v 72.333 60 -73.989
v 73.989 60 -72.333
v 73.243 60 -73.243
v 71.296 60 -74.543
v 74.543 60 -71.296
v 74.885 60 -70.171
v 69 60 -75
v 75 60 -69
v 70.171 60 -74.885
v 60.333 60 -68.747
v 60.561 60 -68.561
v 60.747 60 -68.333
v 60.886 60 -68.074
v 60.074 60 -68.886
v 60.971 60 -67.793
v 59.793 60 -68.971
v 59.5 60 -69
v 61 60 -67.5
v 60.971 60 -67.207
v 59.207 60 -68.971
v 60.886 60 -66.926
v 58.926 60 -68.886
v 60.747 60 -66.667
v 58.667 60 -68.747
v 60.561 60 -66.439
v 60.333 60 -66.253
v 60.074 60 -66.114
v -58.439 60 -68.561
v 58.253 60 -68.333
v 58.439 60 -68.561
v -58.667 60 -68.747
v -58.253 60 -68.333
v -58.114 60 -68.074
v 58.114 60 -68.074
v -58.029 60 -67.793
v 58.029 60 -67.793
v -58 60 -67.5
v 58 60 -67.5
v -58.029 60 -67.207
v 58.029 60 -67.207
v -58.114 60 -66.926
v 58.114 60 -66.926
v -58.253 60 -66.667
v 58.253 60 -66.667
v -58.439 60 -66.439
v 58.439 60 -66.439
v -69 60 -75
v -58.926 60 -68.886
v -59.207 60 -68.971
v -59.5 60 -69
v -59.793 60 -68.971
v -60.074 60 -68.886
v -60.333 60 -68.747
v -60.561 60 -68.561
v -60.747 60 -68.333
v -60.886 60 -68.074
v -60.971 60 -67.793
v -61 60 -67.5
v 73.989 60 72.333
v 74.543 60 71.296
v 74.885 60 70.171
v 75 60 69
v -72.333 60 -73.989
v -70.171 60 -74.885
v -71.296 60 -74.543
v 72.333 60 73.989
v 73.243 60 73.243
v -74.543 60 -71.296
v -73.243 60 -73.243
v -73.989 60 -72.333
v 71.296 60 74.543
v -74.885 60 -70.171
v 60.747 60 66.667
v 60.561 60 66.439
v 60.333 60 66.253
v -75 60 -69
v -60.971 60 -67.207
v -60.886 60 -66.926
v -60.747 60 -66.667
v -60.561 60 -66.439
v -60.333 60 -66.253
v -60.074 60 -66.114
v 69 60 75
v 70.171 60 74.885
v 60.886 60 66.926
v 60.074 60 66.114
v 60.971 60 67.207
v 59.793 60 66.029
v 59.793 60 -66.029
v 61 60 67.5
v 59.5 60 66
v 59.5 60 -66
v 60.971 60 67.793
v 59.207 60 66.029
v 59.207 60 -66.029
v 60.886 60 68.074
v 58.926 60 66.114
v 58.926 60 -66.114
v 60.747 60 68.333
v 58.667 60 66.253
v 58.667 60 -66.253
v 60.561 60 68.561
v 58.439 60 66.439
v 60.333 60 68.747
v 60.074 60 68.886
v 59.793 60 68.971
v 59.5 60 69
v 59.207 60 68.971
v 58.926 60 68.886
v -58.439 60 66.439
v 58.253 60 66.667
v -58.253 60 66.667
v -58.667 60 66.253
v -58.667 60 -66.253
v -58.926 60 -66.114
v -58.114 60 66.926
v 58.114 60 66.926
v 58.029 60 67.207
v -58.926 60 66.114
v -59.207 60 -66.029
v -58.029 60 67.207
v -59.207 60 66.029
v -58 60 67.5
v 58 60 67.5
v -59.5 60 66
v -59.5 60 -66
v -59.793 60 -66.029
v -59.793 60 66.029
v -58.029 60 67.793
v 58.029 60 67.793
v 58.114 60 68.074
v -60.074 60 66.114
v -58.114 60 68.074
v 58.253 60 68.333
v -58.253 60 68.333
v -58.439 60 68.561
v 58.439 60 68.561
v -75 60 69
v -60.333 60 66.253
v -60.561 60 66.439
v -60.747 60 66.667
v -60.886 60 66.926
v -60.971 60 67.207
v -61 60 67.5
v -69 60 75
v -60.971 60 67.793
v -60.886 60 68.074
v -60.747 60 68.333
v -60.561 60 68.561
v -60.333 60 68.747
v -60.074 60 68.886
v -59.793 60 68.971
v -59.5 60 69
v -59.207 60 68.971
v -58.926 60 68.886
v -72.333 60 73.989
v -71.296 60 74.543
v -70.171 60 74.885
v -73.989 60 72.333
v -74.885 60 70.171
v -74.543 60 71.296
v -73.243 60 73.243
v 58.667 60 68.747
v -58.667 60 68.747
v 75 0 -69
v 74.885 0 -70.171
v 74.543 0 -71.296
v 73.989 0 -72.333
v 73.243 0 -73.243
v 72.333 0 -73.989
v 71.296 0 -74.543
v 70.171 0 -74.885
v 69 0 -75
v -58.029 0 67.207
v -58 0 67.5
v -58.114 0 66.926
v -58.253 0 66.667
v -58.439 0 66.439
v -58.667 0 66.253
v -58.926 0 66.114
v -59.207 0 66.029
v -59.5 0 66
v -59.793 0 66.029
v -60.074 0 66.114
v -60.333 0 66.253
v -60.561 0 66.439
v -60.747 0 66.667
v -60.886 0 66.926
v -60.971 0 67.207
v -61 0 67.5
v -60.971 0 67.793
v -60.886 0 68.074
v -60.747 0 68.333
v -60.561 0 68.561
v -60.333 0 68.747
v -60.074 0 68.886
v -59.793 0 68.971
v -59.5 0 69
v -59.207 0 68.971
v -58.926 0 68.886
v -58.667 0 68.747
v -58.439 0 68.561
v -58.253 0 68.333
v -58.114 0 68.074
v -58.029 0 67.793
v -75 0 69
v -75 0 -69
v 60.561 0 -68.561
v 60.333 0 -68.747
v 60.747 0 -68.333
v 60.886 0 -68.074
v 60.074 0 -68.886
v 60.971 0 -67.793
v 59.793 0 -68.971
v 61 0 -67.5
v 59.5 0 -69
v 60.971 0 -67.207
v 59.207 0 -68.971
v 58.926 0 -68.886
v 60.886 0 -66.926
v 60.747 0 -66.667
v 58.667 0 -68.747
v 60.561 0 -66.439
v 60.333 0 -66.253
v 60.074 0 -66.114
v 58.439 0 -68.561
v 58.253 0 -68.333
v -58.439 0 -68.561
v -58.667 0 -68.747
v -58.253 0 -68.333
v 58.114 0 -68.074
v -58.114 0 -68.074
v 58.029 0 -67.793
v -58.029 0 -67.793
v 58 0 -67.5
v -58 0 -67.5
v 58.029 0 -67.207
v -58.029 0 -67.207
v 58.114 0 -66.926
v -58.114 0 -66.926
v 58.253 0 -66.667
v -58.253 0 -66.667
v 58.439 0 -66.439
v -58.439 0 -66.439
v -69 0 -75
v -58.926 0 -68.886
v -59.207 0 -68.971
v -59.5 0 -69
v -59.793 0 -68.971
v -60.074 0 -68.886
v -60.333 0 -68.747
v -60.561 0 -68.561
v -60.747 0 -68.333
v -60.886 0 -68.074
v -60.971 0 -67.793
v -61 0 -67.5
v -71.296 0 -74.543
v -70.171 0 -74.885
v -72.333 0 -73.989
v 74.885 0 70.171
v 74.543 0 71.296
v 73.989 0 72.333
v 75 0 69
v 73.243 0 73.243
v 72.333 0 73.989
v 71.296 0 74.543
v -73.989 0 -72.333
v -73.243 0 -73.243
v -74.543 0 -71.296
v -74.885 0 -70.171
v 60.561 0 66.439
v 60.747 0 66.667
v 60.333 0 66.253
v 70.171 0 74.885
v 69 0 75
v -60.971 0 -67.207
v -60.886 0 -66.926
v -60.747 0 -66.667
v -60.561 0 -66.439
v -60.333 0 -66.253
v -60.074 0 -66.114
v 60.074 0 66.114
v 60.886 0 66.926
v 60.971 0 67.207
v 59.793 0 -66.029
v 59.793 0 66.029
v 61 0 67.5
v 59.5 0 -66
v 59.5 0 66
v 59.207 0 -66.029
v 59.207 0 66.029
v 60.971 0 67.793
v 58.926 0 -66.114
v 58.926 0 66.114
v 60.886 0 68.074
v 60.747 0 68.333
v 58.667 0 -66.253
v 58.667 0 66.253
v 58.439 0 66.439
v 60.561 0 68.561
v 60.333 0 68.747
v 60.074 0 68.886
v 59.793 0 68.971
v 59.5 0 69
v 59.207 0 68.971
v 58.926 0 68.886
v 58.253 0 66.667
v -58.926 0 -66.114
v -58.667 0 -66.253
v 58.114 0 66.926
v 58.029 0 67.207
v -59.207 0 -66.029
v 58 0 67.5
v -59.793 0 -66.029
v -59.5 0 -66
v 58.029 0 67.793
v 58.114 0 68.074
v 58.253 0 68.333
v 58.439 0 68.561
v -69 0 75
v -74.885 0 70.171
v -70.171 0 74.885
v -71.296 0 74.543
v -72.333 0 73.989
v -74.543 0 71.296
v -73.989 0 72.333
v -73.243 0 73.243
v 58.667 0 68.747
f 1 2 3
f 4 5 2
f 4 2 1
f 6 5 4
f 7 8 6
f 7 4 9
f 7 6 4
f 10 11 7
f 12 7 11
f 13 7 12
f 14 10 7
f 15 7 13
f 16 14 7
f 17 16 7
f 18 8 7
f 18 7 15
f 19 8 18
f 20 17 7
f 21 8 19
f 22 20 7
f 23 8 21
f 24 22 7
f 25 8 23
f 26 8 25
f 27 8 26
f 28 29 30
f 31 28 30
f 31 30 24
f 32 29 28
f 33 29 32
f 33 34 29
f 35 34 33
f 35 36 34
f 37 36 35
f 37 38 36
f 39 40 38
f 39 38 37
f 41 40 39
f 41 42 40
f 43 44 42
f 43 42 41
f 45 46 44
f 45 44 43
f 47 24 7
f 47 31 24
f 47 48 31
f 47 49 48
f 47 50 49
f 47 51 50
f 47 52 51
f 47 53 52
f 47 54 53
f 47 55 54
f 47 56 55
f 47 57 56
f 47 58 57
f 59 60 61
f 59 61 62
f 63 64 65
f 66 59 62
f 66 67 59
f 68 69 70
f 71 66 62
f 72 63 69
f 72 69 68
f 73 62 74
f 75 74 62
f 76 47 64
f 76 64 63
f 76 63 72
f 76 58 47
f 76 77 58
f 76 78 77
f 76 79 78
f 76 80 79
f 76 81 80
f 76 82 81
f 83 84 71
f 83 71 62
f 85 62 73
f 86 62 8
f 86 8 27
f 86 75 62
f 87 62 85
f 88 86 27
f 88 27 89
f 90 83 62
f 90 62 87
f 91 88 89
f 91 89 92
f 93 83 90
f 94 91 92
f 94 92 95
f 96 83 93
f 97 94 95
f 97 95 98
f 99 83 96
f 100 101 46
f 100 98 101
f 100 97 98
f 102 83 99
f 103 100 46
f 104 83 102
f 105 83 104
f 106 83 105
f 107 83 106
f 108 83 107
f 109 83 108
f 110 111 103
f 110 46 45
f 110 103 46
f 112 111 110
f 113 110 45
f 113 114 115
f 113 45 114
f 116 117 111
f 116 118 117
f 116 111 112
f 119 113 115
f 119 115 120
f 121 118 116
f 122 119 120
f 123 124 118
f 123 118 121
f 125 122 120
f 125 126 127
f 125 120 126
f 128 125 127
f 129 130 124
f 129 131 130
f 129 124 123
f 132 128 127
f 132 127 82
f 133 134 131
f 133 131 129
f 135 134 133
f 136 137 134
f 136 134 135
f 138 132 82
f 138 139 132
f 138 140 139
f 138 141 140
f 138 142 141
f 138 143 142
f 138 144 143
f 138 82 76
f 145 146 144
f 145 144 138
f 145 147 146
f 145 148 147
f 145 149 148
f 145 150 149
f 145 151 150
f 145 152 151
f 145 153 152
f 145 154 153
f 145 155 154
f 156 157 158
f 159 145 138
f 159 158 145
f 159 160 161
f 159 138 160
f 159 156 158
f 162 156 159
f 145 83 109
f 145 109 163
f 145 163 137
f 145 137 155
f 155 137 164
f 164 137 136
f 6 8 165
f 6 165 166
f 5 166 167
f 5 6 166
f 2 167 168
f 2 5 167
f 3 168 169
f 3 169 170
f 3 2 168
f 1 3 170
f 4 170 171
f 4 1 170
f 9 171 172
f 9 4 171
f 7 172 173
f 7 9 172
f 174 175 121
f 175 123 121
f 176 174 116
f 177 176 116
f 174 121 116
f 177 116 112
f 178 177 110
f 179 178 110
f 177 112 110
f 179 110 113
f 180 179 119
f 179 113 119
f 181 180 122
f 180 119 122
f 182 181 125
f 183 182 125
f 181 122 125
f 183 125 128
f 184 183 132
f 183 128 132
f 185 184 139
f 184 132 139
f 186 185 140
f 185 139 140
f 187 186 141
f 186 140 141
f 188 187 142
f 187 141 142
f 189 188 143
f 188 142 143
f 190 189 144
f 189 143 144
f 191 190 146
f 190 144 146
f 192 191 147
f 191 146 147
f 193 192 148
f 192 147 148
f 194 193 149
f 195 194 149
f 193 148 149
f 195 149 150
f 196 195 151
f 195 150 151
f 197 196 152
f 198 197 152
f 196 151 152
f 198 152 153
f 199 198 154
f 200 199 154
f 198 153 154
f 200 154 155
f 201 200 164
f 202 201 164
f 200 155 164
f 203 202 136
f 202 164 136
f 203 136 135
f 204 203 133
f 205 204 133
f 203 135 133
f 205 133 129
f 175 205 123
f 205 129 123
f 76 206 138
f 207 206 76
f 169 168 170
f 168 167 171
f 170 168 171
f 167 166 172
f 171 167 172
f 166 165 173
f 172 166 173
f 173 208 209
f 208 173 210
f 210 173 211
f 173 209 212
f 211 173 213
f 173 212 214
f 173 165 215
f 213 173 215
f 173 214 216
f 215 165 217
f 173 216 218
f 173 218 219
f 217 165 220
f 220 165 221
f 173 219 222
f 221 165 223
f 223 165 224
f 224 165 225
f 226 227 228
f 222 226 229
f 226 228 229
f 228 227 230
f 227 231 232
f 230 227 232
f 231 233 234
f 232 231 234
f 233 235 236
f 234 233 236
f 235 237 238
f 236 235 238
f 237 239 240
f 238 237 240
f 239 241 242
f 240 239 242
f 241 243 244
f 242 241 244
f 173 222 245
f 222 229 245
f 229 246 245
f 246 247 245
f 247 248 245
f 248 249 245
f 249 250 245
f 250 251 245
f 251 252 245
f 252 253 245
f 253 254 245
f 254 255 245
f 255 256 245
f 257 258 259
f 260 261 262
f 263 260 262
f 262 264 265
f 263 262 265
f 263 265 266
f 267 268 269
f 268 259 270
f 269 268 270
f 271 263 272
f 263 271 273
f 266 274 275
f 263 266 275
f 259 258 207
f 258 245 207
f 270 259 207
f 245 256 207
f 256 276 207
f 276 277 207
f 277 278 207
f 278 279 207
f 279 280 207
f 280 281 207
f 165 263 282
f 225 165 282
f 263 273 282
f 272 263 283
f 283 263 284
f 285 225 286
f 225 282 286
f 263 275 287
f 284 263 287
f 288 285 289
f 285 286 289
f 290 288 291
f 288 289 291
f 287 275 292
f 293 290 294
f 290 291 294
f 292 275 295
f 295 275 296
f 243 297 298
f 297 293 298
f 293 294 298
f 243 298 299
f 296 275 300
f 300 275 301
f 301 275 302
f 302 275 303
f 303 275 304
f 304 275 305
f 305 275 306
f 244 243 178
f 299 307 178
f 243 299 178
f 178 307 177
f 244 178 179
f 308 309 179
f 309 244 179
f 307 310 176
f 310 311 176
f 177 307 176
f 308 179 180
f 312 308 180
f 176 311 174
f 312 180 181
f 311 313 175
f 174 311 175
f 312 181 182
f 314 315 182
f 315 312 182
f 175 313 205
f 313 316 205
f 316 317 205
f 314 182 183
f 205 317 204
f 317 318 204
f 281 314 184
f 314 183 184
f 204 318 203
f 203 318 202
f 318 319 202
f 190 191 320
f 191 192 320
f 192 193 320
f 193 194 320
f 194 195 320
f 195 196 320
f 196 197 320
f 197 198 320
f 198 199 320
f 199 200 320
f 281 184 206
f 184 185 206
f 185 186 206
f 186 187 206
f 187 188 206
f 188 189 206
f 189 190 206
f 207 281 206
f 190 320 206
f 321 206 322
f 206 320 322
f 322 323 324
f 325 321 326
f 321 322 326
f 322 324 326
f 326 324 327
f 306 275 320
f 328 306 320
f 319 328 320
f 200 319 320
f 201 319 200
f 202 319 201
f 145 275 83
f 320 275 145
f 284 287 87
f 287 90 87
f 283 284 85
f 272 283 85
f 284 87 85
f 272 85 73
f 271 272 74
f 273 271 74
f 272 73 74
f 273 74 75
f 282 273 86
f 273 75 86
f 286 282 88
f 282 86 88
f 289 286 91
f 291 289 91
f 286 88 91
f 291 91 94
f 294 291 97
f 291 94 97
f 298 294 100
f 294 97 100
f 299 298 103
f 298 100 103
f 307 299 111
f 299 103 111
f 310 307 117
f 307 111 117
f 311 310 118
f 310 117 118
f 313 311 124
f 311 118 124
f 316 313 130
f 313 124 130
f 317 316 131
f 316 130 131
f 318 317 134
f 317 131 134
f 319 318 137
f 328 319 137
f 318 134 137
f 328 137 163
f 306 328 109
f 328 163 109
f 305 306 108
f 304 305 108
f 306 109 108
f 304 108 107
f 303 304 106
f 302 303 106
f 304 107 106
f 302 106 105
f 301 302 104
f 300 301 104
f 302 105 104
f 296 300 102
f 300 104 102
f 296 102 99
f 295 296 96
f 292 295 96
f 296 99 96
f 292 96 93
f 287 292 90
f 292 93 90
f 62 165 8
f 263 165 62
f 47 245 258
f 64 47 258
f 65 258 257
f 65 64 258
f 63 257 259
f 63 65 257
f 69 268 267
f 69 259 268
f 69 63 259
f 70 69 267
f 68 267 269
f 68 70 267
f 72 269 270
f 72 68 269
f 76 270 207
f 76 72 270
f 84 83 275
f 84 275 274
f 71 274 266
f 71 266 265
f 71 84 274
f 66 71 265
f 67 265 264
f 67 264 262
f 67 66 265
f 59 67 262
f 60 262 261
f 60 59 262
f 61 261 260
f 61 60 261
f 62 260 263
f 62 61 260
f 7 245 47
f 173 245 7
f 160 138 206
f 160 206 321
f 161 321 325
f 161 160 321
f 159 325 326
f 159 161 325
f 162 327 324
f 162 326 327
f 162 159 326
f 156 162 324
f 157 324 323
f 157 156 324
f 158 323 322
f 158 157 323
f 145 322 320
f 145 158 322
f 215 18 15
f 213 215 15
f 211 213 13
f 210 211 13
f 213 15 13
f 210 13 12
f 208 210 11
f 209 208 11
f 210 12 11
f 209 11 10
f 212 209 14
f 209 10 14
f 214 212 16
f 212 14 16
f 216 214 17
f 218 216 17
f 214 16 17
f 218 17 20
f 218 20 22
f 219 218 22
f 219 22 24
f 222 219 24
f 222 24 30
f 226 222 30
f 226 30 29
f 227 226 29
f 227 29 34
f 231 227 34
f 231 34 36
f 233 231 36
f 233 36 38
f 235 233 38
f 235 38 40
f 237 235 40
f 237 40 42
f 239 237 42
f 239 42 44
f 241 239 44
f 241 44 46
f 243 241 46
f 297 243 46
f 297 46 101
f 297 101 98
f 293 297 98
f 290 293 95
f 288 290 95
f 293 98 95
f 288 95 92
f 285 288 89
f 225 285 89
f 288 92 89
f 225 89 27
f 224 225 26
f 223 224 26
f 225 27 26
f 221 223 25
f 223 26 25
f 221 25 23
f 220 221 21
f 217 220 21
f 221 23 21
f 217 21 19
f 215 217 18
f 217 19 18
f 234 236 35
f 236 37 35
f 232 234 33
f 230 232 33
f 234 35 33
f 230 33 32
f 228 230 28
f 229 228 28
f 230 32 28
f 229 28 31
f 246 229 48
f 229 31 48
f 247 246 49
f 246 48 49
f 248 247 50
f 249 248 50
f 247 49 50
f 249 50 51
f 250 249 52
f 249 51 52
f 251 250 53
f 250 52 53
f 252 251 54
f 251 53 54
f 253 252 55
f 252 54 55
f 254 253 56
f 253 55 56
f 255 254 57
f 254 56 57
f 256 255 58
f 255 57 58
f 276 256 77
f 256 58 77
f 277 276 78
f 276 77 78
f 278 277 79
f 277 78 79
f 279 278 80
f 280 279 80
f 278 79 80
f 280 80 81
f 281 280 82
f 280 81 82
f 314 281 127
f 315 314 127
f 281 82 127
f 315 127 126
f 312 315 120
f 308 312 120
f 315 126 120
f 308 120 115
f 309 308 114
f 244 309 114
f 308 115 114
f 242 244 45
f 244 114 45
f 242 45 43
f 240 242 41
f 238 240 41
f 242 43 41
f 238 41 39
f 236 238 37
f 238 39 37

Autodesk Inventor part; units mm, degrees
sketch "Sketch1" plane through (0, 0, 0) normal (0, 1, 0) x (-1, 0, 0)
  line L0 (-75, 75) -> (75, 75)
  line L1 (75, 75) -> (75, -75)
  line L2 (75, -75) -> (-75, -75)
  line L3 (-75, -75) -> (-75, 75)
  line L4 (-75, 75) -> (75, -75) construction
  line L5 (75, 75) -> (-75, -75) construction
  point P0 (0, 0)
  dimension "d0" = 150
  dimension "d1" = 150
extrude "Extrusion1" add sketch "Sketch1" along normal blind 60
sketch "Sketch2" plane through (0, 60, 0) normal (0, 1, 0) x (1, 0, 0)
  circle A0 centre (-59.5, 67.5) radius 1.5
  circle A1 centre (59.5, 67.5) radius 1.5
  circle A2 centre (59.5, -67.5) radius 1.5
  circle A3 centre (-59.5, -67.5) radius 1.5
  line L0 (0, 105) -> (0, -105) projected
  line L1 (105, 0) -> (-105, 0) projected
  circle A4 centre (-59.5, 67.5) radius 1.5
  circle A5 centre (59.5, 67.5) radius 1.5
  circle A6 centre (59.5, -67.5) radius 1.5
  circle A7 centre (-59.5, -67.5) radius 1.5
  point P0 (0, 0)
  dimension "d4" = 3
  dimension "d5" = 119
  dimension "d6" = 135
  dimension "d7" = 59.5
  dimension "d8" = 67.5
  dimension "d11" = 3
extrude "Extrusion2" cut sketch "Sketch2" against normal through all
fillet "Fillet1" radius 6 4 edges at (75, 30, 75) (-75, 30, 75) (75, 30, -75) (-75, 30, -75)
equation "\"d7\" = 0.5 * d5"
equation "\"d8\" = 0.5 * d6"
properties part number "BOX"
